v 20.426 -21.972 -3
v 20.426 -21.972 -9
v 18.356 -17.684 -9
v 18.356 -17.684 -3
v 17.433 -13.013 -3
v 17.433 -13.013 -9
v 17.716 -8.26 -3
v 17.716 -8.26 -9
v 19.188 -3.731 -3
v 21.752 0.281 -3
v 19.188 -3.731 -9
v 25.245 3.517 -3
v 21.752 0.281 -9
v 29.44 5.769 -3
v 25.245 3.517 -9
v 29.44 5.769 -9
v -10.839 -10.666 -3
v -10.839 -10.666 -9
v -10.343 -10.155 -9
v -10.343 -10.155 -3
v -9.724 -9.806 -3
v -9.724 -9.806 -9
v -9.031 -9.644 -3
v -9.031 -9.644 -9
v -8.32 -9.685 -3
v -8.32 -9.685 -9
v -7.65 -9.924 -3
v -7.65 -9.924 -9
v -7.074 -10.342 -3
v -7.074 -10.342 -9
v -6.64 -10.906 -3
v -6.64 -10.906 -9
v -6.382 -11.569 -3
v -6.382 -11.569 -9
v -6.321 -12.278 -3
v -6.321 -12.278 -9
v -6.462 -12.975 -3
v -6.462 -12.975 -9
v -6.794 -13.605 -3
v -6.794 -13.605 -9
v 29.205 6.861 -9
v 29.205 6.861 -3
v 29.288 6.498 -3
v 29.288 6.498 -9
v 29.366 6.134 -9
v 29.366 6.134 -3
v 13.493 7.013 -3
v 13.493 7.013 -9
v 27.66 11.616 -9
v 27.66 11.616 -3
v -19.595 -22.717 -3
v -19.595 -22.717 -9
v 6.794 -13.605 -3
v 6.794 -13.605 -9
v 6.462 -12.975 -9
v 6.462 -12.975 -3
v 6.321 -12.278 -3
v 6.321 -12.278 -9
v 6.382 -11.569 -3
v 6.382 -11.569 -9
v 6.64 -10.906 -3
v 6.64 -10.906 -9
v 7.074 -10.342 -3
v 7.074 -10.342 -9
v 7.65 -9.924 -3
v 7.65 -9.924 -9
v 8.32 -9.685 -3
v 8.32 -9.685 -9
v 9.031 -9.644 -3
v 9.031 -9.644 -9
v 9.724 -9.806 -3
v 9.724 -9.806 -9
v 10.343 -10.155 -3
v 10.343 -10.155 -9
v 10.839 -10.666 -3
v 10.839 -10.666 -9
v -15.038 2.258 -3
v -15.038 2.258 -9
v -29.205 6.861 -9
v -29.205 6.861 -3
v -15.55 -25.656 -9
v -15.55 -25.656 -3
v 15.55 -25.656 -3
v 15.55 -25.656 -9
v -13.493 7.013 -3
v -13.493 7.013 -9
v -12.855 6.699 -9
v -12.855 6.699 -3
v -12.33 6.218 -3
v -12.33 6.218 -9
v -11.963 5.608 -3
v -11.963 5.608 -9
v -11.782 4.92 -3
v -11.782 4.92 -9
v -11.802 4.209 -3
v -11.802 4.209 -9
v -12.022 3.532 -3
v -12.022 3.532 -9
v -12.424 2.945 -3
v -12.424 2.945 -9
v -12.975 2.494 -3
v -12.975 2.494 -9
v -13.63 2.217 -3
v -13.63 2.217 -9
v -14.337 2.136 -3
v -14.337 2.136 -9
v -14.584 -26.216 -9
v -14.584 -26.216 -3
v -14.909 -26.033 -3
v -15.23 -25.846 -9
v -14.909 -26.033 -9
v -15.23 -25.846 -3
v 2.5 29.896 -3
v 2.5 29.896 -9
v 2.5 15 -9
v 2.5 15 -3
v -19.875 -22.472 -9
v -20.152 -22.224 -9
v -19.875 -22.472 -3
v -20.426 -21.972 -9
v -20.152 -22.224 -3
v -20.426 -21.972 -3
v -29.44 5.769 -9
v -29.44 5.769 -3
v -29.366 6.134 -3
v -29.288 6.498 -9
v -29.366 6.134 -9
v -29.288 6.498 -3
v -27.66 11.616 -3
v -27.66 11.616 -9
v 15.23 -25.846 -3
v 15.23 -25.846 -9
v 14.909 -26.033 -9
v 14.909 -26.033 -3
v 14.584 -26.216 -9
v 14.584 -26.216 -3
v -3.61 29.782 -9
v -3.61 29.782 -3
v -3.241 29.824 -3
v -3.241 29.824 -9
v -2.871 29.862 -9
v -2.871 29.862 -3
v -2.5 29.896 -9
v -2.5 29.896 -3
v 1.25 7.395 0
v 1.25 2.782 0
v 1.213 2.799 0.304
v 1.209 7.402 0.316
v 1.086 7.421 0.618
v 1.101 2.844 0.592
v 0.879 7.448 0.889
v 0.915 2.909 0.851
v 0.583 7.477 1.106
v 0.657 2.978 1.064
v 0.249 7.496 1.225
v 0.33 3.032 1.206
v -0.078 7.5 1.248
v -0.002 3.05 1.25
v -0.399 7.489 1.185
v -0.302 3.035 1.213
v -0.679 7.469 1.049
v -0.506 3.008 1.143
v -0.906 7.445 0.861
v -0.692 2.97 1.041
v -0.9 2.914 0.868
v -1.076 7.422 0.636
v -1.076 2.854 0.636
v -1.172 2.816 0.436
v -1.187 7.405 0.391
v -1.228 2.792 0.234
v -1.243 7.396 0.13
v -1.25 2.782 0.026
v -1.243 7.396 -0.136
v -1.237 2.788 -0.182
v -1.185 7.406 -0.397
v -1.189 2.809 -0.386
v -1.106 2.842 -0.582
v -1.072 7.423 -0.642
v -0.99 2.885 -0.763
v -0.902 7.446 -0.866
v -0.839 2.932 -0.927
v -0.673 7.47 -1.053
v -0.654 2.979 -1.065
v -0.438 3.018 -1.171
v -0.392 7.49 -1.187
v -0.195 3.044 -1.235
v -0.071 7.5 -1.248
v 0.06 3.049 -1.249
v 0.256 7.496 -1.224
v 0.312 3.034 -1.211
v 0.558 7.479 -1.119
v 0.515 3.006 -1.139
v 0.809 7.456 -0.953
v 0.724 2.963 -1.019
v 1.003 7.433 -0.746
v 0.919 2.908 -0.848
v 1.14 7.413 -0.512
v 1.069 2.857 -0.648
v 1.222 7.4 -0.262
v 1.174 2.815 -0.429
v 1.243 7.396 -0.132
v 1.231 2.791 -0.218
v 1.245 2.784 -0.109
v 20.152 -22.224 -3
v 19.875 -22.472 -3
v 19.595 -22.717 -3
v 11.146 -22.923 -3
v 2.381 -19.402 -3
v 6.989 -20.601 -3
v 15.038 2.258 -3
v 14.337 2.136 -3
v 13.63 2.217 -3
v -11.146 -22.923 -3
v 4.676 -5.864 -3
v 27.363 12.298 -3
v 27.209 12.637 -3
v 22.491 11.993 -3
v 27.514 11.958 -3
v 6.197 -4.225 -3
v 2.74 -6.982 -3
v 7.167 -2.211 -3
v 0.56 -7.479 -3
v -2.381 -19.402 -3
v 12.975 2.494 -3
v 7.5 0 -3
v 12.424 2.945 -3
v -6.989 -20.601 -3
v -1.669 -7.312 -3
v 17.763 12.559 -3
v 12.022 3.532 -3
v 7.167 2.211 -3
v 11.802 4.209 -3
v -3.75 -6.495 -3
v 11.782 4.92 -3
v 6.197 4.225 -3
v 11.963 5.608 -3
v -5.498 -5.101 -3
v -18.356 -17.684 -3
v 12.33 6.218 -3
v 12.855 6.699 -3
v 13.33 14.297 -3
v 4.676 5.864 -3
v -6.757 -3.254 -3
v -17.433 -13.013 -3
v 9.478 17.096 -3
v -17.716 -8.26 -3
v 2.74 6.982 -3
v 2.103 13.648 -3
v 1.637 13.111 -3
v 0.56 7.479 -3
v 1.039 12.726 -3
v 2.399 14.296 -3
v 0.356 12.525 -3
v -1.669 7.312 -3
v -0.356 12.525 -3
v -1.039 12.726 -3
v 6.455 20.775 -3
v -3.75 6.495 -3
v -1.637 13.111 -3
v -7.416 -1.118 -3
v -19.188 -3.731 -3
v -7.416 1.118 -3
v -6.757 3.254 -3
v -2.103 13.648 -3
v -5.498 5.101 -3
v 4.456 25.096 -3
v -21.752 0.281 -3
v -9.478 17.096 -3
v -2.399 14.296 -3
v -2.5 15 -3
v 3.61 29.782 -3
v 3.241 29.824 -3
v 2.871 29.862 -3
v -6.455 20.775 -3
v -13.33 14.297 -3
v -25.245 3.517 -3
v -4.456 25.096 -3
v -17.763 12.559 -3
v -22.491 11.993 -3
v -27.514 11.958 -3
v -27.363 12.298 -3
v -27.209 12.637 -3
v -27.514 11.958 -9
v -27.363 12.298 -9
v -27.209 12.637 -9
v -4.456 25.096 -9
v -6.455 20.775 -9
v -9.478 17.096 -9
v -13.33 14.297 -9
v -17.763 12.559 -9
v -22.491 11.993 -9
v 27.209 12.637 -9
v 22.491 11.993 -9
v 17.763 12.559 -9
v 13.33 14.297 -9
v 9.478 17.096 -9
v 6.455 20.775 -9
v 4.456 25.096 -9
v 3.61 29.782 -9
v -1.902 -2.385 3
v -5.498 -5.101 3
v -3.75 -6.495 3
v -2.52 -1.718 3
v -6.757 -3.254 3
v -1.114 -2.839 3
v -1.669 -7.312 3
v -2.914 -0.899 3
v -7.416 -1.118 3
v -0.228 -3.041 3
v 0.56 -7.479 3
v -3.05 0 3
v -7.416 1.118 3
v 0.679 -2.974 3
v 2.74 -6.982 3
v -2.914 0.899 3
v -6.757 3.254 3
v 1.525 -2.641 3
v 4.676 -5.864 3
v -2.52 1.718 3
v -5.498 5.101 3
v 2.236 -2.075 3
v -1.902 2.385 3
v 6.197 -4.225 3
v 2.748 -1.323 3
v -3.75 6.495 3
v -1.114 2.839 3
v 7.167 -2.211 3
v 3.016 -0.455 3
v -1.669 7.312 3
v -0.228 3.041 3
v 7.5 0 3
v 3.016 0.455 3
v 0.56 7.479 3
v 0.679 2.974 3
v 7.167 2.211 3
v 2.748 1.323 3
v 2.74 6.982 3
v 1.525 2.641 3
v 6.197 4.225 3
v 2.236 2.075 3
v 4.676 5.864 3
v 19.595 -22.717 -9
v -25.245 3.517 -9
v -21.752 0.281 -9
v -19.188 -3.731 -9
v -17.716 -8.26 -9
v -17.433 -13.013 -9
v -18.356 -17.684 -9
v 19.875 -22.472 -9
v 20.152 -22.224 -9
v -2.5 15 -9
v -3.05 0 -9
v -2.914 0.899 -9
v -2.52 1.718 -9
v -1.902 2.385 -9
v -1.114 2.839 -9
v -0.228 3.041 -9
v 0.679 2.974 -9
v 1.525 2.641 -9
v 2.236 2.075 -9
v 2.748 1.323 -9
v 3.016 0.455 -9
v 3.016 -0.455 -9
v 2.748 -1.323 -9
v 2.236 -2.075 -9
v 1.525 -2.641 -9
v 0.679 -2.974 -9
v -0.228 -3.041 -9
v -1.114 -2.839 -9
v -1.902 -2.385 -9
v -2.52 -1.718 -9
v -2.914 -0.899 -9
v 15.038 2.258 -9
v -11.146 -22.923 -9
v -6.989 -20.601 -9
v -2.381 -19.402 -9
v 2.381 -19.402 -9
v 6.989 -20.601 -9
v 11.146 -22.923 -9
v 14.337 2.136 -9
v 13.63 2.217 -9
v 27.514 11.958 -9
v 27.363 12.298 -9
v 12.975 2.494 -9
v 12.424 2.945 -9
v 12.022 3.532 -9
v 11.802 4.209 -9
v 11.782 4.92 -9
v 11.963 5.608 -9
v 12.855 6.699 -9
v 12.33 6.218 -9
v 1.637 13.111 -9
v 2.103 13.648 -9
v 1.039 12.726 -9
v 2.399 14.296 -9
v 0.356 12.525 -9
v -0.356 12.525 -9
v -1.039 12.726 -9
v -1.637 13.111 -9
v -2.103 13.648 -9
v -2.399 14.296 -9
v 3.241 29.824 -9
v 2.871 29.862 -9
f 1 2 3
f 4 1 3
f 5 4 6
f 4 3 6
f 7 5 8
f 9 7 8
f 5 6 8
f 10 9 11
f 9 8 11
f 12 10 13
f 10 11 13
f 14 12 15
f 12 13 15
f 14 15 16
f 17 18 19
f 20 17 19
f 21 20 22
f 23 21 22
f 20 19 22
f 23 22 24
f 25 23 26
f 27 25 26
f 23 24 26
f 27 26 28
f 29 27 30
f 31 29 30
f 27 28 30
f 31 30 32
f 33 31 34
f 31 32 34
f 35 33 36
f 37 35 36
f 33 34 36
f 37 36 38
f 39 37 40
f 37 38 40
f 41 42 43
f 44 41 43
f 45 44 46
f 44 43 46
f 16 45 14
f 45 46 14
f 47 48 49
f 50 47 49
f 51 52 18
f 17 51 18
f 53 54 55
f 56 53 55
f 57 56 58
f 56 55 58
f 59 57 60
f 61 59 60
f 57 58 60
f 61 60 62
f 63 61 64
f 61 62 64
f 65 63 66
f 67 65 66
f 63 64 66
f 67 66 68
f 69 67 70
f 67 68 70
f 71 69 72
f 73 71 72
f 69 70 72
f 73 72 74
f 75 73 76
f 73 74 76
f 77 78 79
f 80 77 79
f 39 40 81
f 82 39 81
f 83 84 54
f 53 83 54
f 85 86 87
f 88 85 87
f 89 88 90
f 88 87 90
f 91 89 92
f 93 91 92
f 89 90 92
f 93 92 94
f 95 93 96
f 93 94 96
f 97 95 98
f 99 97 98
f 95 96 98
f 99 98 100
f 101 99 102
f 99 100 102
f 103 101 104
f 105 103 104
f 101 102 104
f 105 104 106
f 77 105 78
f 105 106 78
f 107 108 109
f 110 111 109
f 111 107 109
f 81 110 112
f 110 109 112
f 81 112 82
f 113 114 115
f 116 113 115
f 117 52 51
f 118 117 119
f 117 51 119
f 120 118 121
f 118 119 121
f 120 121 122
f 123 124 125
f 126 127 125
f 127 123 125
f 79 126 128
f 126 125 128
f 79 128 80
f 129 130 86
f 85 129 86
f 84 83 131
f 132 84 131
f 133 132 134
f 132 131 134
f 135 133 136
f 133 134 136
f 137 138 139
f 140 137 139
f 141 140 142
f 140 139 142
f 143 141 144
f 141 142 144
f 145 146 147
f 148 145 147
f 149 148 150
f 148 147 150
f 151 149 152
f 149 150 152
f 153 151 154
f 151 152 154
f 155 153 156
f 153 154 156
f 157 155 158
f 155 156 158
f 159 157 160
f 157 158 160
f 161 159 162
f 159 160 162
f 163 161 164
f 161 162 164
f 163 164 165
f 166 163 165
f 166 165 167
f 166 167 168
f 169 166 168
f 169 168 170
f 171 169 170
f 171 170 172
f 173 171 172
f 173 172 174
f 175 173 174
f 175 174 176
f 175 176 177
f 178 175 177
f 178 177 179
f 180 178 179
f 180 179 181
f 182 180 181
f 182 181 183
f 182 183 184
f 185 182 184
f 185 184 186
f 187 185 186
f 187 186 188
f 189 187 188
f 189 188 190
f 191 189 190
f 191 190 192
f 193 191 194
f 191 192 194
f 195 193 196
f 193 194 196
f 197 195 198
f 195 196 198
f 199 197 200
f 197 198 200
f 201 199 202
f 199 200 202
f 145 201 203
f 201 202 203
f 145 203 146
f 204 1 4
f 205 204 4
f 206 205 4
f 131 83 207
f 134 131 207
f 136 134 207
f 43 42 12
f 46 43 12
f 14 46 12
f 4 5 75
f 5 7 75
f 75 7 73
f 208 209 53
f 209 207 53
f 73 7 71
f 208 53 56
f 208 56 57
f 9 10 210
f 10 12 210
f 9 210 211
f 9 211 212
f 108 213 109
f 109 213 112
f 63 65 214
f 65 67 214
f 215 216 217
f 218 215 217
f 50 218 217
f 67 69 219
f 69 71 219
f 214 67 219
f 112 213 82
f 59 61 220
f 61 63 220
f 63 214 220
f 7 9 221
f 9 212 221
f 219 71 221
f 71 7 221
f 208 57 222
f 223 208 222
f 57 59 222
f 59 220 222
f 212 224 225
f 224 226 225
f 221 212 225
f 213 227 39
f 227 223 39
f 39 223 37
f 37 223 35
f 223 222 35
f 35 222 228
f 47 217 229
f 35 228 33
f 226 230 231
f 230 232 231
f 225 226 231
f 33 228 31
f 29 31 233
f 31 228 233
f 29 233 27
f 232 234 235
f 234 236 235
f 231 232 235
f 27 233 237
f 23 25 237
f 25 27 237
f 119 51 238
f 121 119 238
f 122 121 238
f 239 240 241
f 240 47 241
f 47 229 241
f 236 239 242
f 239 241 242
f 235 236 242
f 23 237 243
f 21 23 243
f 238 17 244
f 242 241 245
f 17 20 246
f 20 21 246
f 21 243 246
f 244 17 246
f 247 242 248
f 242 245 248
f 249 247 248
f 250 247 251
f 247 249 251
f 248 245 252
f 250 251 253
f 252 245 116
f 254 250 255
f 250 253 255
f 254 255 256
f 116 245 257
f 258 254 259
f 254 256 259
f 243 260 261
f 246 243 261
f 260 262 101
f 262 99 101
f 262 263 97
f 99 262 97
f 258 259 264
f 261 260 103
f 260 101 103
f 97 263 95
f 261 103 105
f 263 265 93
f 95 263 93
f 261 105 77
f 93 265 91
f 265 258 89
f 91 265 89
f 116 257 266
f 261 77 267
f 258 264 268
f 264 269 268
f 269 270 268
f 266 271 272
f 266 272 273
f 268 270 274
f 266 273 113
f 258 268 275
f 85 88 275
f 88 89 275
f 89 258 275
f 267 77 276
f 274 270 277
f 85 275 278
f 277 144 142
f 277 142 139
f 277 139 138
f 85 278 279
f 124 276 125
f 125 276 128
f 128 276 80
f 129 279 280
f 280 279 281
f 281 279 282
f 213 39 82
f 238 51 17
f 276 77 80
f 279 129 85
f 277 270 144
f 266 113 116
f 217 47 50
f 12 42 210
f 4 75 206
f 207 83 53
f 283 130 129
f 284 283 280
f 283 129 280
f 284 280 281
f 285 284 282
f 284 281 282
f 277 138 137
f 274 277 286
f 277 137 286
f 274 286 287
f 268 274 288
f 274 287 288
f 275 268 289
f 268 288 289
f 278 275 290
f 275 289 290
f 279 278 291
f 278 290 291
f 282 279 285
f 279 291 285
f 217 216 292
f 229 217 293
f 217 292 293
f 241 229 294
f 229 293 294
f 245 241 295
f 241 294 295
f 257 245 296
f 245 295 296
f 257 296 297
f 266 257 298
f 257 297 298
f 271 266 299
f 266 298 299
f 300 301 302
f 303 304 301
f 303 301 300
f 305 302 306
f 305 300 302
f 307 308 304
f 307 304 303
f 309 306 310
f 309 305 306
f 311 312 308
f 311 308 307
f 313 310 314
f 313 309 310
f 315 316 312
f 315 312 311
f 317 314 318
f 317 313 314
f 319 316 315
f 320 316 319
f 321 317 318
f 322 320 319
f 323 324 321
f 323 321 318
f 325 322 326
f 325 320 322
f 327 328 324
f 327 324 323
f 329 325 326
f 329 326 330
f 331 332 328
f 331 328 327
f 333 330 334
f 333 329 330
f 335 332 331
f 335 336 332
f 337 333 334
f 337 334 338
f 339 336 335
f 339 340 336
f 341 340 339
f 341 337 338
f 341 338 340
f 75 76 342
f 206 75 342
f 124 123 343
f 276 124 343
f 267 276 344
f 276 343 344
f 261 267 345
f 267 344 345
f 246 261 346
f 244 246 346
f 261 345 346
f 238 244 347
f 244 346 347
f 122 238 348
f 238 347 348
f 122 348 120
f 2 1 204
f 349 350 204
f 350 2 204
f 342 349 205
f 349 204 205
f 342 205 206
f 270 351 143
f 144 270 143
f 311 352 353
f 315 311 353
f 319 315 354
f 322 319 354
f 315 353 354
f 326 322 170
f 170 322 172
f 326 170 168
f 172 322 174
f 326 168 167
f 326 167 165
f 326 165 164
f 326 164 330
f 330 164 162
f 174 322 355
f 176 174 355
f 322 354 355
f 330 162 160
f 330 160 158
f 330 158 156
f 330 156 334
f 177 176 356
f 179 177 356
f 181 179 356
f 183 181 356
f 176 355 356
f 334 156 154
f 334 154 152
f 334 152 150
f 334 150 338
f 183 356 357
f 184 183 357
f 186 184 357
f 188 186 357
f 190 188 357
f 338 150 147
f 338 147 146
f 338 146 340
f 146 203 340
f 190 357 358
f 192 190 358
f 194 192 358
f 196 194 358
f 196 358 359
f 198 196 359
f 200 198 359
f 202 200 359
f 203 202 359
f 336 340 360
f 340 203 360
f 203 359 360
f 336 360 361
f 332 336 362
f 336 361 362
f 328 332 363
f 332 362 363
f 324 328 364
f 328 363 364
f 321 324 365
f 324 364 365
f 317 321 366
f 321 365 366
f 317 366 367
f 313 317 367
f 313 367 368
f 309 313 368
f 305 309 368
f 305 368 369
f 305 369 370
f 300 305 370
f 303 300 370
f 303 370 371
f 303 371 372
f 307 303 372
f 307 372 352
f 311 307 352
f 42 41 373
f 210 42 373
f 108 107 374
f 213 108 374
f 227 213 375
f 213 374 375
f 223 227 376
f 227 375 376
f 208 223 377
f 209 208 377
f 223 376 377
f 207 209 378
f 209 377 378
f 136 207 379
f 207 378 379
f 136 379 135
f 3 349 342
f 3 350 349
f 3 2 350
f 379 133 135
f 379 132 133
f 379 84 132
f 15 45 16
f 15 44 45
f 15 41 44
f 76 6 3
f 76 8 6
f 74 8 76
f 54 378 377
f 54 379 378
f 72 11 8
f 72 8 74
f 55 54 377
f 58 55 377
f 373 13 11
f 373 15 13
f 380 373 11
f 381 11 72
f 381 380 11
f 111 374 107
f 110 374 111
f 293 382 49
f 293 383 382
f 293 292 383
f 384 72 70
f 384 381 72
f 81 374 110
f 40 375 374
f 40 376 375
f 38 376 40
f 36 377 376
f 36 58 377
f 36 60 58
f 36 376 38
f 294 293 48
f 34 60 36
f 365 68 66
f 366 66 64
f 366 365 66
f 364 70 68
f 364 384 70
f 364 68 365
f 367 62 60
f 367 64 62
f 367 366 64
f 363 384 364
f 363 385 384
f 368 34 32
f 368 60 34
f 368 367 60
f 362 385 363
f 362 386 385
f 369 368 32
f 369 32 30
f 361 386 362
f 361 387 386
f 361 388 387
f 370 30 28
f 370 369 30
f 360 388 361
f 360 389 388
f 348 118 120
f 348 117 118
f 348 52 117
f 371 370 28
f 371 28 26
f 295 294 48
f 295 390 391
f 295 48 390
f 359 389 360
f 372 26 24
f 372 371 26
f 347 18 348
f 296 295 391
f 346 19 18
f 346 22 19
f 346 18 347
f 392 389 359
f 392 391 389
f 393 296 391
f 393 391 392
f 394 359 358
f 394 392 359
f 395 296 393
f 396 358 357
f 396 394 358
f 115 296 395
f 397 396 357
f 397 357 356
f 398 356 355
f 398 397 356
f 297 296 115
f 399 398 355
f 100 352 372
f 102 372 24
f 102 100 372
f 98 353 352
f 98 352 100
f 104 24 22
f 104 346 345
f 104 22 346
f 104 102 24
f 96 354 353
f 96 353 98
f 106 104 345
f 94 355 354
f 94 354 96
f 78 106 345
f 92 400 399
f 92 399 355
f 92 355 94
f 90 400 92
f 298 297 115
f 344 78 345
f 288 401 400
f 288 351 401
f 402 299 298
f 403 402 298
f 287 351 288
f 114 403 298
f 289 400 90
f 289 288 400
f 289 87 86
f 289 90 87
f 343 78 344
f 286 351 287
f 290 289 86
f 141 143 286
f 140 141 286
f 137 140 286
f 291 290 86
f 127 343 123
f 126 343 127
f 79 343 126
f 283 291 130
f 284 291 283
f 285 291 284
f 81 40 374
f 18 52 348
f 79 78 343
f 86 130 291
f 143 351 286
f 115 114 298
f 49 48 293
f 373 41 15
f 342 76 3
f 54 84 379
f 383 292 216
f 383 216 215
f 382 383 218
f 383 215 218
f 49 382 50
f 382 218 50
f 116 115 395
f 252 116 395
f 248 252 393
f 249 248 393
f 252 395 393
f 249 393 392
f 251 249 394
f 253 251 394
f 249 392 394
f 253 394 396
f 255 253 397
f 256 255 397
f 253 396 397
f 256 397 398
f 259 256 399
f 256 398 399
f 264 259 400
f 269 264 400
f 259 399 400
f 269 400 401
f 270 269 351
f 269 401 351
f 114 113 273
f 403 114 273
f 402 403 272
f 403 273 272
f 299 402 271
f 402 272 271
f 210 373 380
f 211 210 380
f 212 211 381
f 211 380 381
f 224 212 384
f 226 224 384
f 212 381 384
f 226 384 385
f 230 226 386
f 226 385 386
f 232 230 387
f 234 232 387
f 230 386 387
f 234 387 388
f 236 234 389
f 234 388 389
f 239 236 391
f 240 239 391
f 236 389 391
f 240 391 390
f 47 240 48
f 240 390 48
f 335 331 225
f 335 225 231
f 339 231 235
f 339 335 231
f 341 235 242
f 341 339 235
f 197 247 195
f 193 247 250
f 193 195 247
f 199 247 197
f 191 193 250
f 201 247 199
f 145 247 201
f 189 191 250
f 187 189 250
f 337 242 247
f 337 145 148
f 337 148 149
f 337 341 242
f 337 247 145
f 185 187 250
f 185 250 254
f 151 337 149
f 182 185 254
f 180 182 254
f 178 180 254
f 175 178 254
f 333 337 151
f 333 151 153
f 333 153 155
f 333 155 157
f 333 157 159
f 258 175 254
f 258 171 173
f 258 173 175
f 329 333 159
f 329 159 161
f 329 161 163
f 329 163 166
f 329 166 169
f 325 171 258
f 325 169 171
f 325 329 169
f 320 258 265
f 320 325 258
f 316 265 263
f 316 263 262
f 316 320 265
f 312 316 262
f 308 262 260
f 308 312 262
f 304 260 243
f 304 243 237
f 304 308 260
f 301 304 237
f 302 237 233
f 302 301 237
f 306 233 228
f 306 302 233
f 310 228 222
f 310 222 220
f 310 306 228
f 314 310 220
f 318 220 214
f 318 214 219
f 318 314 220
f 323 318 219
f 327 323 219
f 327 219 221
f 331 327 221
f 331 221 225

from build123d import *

# Parameters (mm, degrees)
SKETCH1_R                 = 7.5
EXTRUDE1_DEPTH            = 3
SKETCH2_R                 = 30
EXTRUDE2_DEPTH            = 6
SKETCH3_R                 = 18.5
CUT_EXTRUDE1_DEPTH        = 45.09081537
CUT_EXTRUDE2_DEPTH        = 45.09081537
SKETCH8_R                 = 18.75
EXTRUDE3_DEPTH            = 45.09081537
CIRPATTERN1_COUNT         = 5
SKETCH5_R                 = 3.05
CUT_EXTRUDE3_DEPTH        = 44.640169222
M3X0_5_TAPPED_HOLE1_D     = 2.5
M3X0_5_TAPPED_HOLE1_DEPTH = 7.5
M3X0_5_TAPPED_HOLE1_TIP   = 0.751075774


with BuildPart() as part:
    # Sketch1 → Extrude1 (new, symmetric)
    with BuildSketch(Plane.XY):
        Circle(SKETCH1_R)
    extrude(amount=EXTRUDE1_DEPTH, both=True)

    # Sketch2 → Extrude2 (add)
    with BuildSketch(Plane(origin=(0, 0, -3), x_dir=(-1, 0, 0), z_dir=(0, 0, -1))):
        Circle(SKETCH2_R)
    extrude(amount=EXTRUDE2_DEPTH)

    # Sketch3 → Cut-Extrude1 (cut, through all)
    with BuildSketch(Plane(origin=(0, 0, -9), x_dir=(-1, 0, 0), z_dir=(0, 0, -1))):
        with Locations((0, -38)):
            Circle(SKETCH3_R)
    cut_extrude1 = extrude(amount=-CUT_EXTRUDE1_DEPTH, mode=Mode.SUBTRACT)

    # Sketch4 → Cut-Extrude2 (cut, through all)
    with BuildSketch(Plane(origin=(0, 0, -9), x_dir=(-1, 0, 0), z_dir=(0, 0, -1))):
        with BuildLine():
            Line((6.794236298, -13.604718046), (15.549680784, -25.655553542))
            ThreePointArc((15.549680784, -25.655553542), (17.633557569, -24.270509831), (19.594765756, -22.71662728))
            Line((19.594765756, -22.71662728), (10.83932127, -10.665791785))
            ThreePointArc((10.83932127, -10.665791785), (7.347315654, -10.11271243), (6.794236298, -13.604718046))
        make_face()
    cut_extrude2 = extrude(amount=-CUT_EXTRUDE2_DEPTH, mode=Mode.SUBTRACT)

    # Sketch8 → Extrude3 (cut, through all)
    with BuildSketch(Plane(origin=(0, 0, -9), x_dir=(-1, 0, 0), z_dir=(0, 0, -1))):
        with Locations((0, -38)):
            Circle(SKETCH8_R)
    extrude3 = extrude(amount=-EXTRUDE3_DEPTH, mode=Mode.SUBTRACT)

    # CirPattern1: Cut-Extrude1, Cut-Extrude2, Extrude3 ×5 about axis
    cirpattern1_axis = Axis((0, 0, -9.6), (0, 0, 1))
    add([cut_extrude1.rotate(cirpattern1_axis, i * 360 / CIRPATTERN1_COUNT) for i in range(1, CIRPATTERN1_COUNT)], mode=Mode.SUBTRACT)
    add([cut_extrude2.rotate(cirpattern1_axis, i * 360 / CIRPATTERN1_COUNT) for i in range(1, CIRPATTERN1_COUNT)], mode=Mode.SUBTRACT)
    add([extrude3.rotate(cirpattern1_axis, i * 360 / CIRPATTERN1_COUNT) for i in range(1, CIRPATTERN1_COUNT)], mode=Mode.SUBTRACT)

    # Sketch5 → Cut-Extrude3 (cut, through all)
    with BuildSketch(Plane(origin=(0, 0, -9), x_dir=(-1, 0, 0), z_dir=(0, 0, -1))):
        Circle(SKETCH5_R)
    extrude(amount=-CUT_EXTRUDE3_DEPTH, mode=Mode.SUBTRACT)

    # M3x0.5 Tapped Hole1
    with Locations(Plane(origin=(0, 7.5, 0), x_dir=(-1, 0, 0), z_dir=(0, 1, 0))):
        with Locations((0, 0)):
            Hole(M3X0_5_TAPPED_HOLE1_D / 2, depth=M3X0_5_TAPPED_HOLE1_DEPTH)
            with Locations((0, 0, -(M3X0_5_TAPPED_HOLE1_DEPTH + M3X0_5_TAPPED_HOLE1_TIP / 2))):  # 118° drill point
                Cone(0, M3X0_5_TAPPED_HOLE1_D / 2, M3X0_5_TAPPED_HOLE1_TIP, mode=Mode.SUBTRACT)


solid = part.part
